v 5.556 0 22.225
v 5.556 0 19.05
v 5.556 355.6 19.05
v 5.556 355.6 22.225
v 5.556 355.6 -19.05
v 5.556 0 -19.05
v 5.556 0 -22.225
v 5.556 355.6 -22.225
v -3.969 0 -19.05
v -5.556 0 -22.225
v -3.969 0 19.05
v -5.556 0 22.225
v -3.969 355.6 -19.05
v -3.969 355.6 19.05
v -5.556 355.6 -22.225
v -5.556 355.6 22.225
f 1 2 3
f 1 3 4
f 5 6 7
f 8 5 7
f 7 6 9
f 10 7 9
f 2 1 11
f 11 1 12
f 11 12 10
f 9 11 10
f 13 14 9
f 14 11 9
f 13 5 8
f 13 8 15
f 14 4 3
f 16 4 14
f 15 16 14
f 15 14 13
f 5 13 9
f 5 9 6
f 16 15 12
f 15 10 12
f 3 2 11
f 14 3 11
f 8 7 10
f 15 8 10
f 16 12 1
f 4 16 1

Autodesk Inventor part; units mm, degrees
ref_plane "YZ Plane" through (0, 0, 0) normal (1, 0, 0) x (0, 1, 0)
ref_plane "XZ Plane" through (0, 0, 0) normal (0, 1, 0) x (-1, 0, 0)
ref_plane "XY Plane" through (0, 0, 0) normal (0, 0, 1) x (1, 0, 0)
sketch "Sketch2" plane through (0, 0, 0) normal (0, 1, 0) x (-1, 0, 0)
  line L0 (-5.5563, -22.225) -> (5.5563, -22.225)
  line L1 (5.5563, -22.225) -> (5.5563, 22.225)
  line L2 (5.5563, 22.225) -> (-5.5563, 22.225)
  line L3 (-5.5563, -22.225) -> (5.5563, 22.225) construction
  line L4 (5.5563, -22.225) -> (-5.5563, 22.225) construction
  line L5 (-11.1125, -19.05) -> (1.5875, 19.05) construction
  line L6 (1.5875, -19.05) -> (-11.1125, 19.05) construction
  line L7 (-5.5563, 19.05) -> (-5.5563, 22.225)
  line L8 (-5.5563, -19.05) -> (-5.5563, -22.225)
  line L9 (-5.5563, 19.05) -> (3.9688, 19.05)
  line L10 (3.9688, 19.05) -> (3.9687, -19.05)
  line L11 (3.9687, -19.05) -> (-5.5563, -19.05)
  point P0 (0, 0)
  point P1 (-4.7625, 0)
  dimension "d0" = 11.1125
  dimension "d1" = 44.45
  dimension "d6" = 9.525
  dimension "d7" = 90
extrude "Extrusion1" add sketch "Sketch2" along normal blind 355.6
properties part number "14in-slide-pt_1" material "Aluminum 6061"
